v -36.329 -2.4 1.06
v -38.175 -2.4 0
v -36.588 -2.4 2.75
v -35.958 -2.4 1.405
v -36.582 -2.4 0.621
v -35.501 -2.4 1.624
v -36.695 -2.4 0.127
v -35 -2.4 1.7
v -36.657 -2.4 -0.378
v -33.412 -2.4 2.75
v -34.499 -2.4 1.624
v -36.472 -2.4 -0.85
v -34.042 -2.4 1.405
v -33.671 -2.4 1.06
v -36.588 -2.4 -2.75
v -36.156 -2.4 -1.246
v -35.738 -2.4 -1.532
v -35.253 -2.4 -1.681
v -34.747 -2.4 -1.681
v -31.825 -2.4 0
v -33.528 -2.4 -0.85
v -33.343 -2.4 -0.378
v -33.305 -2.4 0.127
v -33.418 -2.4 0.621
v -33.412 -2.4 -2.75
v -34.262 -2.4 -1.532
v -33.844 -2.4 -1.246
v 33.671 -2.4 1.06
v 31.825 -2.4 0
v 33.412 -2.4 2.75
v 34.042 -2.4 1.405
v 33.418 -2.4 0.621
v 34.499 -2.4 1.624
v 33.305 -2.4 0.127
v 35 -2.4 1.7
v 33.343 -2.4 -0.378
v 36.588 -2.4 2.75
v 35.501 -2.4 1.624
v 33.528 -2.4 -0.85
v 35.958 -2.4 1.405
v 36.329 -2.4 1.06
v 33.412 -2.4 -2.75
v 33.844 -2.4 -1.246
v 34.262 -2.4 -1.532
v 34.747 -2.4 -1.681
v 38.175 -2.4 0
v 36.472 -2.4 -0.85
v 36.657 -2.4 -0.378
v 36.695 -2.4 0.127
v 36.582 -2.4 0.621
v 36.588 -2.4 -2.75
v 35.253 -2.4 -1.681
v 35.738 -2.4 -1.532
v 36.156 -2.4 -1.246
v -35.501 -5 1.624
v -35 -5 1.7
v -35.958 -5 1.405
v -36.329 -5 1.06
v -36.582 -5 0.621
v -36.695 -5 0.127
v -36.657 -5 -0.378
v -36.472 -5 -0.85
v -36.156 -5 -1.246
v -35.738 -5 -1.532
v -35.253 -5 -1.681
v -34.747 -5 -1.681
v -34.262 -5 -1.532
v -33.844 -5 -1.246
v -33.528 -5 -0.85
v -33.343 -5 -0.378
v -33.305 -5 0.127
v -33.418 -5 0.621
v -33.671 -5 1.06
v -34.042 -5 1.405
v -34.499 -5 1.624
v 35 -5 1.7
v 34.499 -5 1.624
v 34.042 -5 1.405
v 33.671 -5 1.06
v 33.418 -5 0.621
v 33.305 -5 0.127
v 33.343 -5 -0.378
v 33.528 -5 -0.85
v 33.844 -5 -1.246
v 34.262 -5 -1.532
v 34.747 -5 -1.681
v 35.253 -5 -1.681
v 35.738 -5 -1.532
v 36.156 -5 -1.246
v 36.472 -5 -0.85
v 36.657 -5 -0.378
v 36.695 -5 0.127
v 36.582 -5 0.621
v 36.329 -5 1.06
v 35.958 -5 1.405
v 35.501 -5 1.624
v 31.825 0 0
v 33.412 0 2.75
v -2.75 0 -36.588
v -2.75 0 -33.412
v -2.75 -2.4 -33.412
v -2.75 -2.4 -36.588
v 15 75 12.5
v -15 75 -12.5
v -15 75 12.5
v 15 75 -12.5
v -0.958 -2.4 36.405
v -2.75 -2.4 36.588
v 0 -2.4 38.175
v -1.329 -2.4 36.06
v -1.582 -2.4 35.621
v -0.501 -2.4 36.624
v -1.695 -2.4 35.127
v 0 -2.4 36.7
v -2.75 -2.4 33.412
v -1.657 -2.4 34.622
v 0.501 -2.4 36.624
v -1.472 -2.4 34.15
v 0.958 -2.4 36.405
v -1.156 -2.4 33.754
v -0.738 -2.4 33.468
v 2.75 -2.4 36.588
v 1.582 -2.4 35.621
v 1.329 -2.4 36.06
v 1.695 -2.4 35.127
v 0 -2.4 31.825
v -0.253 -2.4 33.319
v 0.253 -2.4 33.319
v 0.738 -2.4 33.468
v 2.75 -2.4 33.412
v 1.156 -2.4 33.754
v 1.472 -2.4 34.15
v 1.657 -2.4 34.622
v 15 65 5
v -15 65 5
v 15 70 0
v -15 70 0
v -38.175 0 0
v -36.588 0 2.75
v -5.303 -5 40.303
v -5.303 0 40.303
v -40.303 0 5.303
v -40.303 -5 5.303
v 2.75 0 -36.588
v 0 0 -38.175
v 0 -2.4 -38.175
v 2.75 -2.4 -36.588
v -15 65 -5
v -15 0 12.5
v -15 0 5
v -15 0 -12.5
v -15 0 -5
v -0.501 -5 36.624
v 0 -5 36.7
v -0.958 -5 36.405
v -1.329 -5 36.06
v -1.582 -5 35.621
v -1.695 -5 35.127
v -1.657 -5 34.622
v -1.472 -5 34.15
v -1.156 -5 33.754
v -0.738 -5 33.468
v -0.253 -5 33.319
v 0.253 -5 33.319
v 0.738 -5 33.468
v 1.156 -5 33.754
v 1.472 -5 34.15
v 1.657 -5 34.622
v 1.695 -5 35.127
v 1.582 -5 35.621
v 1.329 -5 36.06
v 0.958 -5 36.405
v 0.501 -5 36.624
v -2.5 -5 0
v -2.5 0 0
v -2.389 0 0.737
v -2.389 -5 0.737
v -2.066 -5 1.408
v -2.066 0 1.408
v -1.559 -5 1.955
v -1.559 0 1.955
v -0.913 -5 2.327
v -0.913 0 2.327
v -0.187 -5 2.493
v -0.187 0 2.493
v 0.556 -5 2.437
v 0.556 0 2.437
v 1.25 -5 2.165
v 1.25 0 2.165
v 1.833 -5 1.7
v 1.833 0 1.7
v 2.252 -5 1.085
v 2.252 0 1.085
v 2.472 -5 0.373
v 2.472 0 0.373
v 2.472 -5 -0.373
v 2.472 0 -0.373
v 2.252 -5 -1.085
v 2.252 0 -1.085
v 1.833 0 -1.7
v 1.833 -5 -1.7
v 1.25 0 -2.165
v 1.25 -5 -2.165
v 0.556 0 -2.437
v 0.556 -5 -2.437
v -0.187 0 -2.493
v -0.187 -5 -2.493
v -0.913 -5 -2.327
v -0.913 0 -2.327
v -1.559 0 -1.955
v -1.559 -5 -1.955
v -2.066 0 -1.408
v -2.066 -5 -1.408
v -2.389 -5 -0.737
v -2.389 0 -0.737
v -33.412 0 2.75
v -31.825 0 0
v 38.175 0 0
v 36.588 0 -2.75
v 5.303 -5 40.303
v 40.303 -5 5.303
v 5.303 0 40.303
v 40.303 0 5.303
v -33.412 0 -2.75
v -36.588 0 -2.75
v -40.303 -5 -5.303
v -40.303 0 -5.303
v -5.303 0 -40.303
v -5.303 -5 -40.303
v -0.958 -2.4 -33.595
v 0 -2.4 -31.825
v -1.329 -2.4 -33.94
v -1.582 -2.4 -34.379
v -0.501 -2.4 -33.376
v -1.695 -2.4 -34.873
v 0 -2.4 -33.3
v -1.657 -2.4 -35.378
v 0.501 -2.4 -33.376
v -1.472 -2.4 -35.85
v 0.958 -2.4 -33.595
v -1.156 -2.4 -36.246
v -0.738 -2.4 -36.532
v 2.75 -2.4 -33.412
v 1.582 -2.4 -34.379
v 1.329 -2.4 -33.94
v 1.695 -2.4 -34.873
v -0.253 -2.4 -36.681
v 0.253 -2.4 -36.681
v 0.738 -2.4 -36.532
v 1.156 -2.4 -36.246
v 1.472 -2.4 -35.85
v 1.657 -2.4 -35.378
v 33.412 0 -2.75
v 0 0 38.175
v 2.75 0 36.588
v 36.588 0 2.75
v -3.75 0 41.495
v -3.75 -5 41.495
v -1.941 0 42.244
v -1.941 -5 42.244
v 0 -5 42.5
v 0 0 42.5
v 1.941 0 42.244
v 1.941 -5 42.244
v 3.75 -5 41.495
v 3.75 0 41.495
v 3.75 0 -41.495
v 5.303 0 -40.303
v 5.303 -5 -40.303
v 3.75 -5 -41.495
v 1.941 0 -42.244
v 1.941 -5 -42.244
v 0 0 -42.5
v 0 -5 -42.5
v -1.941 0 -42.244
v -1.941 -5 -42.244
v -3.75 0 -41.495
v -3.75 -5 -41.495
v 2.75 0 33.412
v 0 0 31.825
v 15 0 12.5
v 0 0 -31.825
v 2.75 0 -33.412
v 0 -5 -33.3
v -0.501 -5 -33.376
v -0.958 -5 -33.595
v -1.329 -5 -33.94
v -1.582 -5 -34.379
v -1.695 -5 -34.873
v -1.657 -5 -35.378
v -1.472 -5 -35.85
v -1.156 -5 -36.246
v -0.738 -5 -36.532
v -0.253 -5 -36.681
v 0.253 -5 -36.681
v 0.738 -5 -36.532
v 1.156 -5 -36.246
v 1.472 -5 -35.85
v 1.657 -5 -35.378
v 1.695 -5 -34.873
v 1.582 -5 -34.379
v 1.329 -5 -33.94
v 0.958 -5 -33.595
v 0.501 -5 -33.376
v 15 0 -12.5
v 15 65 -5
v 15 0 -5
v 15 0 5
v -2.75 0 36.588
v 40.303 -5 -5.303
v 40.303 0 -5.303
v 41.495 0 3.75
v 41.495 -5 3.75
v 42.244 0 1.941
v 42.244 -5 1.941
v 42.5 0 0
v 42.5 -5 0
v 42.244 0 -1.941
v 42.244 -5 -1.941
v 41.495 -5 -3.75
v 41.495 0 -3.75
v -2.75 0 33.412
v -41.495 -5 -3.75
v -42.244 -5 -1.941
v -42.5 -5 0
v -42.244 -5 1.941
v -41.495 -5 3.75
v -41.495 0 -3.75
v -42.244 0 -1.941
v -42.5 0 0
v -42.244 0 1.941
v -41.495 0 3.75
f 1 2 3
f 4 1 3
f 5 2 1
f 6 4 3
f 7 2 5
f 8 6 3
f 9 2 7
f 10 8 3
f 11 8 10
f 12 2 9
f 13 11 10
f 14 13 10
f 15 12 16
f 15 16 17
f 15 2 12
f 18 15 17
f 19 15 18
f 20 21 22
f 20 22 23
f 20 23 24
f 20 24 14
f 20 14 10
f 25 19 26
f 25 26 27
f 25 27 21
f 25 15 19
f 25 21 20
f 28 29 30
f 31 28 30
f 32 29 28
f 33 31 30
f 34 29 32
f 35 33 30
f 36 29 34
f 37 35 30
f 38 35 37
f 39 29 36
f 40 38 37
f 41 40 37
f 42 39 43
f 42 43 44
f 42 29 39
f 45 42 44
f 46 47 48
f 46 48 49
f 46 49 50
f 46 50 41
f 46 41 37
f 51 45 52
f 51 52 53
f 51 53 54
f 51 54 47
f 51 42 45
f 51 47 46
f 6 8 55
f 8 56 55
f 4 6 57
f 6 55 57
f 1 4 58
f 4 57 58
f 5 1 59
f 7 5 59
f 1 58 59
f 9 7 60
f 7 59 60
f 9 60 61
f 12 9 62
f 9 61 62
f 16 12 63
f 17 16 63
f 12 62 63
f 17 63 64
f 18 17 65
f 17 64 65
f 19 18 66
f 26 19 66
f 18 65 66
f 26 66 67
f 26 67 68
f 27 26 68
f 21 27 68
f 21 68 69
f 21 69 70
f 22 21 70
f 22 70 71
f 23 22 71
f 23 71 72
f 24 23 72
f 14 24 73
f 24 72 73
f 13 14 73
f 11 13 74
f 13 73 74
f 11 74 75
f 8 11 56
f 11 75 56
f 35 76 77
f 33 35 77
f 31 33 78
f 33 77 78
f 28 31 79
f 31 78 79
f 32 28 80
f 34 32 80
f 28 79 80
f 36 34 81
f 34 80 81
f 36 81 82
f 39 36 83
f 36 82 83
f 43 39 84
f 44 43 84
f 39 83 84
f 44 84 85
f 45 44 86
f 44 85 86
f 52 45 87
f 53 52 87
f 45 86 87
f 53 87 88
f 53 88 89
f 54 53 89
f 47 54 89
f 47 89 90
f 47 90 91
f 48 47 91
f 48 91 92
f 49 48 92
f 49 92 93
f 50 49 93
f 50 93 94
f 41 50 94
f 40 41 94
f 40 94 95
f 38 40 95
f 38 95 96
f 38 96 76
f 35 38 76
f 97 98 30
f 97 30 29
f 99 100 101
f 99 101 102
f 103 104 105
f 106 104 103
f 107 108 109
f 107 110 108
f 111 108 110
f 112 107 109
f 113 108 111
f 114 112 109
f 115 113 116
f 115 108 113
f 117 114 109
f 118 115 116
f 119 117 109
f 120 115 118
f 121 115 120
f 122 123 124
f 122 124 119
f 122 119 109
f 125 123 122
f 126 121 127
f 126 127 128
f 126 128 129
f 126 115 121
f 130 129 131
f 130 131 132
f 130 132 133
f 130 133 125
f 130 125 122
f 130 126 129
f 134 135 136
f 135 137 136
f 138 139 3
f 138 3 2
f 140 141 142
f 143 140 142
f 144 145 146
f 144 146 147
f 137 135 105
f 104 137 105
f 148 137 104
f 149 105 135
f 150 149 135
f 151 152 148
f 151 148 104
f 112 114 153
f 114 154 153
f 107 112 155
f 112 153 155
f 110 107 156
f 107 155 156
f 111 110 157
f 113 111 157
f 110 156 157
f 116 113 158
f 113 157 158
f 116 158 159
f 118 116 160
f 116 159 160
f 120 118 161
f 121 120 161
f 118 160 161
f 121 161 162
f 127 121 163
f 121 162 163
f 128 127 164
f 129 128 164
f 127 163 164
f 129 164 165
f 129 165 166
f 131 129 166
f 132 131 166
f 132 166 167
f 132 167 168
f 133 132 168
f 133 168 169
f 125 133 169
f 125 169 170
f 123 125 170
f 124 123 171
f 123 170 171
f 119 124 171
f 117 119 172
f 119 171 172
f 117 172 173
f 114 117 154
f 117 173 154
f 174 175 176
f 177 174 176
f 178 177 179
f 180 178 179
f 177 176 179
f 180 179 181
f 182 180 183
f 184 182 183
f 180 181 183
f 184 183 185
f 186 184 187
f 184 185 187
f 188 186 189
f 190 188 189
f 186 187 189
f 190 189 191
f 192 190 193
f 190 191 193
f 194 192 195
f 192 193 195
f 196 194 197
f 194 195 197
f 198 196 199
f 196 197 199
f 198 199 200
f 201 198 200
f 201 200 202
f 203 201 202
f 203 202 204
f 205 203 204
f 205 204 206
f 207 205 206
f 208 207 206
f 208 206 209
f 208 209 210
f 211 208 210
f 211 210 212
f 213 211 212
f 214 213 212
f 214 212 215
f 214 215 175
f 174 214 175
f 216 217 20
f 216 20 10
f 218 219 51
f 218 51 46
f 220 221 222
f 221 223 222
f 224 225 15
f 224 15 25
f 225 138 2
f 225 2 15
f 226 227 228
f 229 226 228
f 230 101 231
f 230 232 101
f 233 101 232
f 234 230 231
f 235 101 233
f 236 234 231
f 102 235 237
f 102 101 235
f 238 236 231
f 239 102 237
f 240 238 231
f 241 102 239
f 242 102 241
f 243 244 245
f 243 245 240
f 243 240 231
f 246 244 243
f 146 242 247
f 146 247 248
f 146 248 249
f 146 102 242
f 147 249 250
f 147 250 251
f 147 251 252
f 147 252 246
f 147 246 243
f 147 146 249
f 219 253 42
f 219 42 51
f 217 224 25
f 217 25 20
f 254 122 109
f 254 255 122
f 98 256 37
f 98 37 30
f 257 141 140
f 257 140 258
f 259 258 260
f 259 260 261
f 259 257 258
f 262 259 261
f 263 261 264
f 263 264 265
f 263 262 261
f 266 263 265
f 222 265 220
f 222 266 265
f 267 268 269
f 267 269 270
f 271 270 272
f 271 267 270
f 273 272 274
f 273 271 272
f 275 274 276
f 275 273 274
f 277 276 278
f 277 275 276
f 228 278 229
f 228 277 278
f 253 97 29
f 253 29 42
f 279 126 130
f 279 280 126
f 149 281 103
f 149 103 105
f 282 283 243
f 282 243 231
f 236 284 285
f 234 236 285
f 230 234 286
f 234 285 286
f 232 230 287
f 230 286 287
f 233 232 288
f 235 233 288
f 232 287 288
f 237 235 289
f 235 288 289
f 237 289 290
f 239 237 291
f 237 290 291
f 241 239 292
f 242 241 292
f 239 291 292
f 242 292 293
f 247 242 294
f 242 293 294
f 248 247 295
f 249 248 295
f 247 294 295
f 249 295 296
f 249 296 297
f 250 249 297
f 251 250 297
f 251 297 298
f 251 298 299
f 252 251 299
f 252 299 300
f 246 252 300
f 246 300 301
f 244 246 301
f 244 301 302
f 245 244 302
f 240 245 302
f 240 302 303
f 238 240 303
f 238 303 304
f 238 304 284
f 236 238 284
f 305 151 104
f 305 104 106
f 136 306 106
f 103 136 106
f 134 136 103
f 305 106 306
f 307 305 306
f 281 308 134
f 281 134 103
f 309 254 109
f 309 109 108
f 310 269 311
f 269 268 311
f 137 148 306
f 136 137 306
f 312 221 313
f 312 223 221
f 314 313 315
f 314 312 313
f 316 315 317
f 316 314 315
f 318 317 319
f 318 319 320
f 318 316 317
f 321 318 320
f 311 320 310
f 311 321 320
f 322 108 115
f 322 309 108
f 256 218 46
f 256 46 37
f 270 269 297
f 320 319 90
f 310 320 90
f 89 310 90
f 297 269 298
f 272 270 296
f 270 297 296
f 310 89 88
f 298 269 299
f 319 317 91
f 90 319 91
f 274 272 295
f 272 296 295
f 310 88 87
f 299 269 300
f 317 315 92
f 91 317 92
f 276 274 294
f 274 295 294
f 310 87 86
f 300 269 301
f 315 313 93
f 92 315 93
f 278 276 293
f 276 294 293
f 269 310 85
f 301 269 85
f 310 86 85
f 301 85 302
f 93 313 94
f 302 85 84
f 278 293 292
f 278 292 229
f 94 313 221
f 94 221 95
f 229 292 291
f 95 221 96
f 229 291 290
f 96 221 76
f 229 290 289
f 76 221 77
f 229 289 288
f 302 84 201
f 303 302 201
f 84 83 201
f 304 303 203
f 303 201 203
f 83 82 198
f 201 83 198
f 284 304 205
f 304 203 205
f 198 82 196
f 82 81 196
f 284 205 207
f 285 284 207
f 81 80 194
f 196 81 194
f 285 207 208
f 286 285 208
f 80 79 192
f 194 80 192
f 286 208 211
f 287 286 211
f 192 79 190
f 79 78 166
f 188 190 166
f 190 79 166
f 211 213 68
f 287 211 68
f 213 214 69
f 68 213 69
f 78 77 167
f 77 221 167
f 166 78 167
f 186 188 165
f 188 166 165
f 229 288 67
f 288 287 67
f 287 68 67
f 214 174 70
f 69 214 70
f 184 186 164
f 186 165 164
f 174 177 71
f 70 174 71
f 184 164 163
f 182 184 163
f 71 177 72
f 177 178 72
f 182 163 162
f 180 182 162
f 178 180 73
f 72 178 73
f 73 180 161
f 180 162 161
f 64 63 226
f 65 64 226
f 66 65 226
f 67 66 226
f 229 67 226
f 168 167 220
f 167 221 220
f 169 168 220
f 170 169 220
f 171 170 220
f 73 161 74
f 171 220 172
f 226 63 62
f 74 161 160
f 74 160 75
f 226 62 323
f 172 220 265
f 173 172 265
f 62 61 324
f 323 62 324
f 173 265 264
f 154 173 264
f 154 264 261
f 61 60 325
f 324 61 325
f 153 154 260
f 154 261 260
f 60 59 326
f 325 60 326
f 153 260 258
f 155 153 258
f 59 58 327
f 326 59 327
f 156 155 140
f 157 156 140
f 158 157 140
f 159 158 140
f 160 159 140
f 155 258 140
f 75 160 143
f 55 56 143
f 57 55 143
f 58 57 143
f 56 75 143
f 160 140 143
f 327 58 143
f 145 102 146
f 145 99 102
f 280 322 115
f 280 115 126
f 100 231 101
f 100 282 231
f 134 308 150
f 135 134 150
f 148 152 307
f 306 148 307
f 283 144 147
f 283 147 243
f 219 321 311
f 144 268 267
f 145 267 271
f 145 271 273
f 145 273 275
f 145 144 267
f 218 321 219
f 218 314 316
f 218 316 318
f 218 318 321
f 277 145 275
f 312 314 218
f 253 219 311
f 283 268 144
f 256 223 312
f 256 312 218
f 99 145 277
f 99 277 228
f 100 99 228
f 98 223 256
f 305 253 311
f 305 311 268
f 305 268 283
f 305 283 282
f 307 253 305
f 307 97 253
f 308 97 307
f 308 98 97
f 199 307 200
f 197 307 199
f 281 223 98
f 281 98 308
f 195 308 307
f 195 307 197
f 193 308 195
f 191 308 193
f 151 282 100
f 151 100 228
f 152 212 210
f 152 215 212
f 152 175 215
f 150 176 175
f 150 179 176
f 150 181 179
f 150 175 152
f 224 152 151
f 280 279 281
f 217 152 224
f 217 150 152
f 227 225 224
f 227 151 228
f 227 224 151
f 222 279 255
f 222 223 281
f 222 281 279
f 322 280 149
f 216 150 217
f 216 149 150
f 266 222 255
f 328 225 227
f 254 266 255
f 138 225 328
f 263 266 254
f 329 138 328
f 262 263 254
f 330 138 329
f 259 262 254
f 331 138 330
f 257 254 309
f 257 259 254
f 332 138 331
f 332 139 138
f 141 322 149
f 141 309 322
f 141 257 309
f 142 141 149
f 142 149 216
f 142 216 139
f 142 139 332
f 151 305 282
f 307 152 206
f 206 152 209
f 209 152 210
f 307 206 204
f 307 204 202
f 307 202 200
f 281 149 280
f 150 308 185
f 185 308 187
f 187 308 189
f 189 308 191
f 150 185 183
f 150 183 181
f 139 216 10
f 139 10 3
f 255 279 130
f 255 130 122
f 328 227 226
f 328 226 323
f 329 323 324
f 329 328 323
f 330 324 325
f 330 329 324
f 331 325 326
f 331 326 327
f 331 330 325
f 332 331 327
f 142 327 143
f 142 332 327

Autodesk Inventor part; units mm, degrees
ref_plane "YZ Plane" through (0, 0, 0) normal (1, 0, 0) x (0, 1, 0)
ref_plane "XZ Plane" through (0, 0, 0) normal (0, 1, 0) x (-1, 0, 0)
ref_plane "XY Plane" through (0, 0, 0) normal (0, 0, 1) x (1, 0, 0)
sketch "Sketch1" plane through (0, 0, 0) normal (0, 1, 0) x (-1, 0, 0)
  circle A0 centre (0, 0) radius 17.5 construction
  line L0 (0, 35) -> (0, -35) construction
  line L1 (35, 0) -> (-35, 0) construction
  dimension "d0" = 35
  dimension "d1" = 70
  dimension "d2" = 70
sketch "Sketch2" plane through (0, 0, 0) normal (0, 1, 0) x (-1, 0, 0)
  circle A0 centre (0, 0) radius 17.5 construction
  line L0 (0, 35) -> (0, -35) construction
  line L1 (35, 0) -> (-35, 0) construction
  circle A1 centre (35, 0) radius 7.5
  circle A2 centre (0, 35) radius 7.5
  circle A3 centre (-35, 0) radius 7.5
  circle A4 centre (0, -35) radius 7.5
  line L2 (5.3033, 40.3033) -> (40.3033, 5.3033)
  line L3 (-40.3033, 5.3033) -> (-5.3033, 40.3033)
  line L4 (-5.3033, -40.3033) -> (-40.3033, -5.3033)
  line L5 (40.3033, -5.3033) -> (5.3033, -40.3033)
  circle A5 centre (0, 0) radius 2.5
  point P0 (5.3033, -40.3033)
  point P1 (-40.3033, -5.3033)
  dimension "d3" = 15
  dimension "d6" = 360
  dimension "d10" = 360
  dimension "d14" = 5
extrude "Extrusion1" add sketch "Sketch2" against normal blind 5
hole "Hole1" at (0, 0, -35) at (0, 0, 35) at (-35, 0, 0) at (35, 0, 0) direction (0, -1, 0) diameter 3.4 end through all clearance for "Socket Head Cap Screw ISO 4762" size "M3" standard "ISO"
sketch "Sketch3" plane through (0, 0, 0) normal (0, 1, 0) x (1, 0, 0)
  line L0 (15, -12.5) -> (-15, -12.5)
  line L1 (-15, -12.5) -> (-15, 12.5)
  line L2 (-15, 12.5) -> (15, 12.5)
  line L3 (15, 12.5) -> (15, -12.5)
  circle A0 centre (0, 0) radius 2.5 projected
  line L4 (15, -12.5) -> (-15, 12.5) construction
  line L5 (-15, -12.5) -> (15, 12.5) construction
  line L6 (15, -5) -> (-15, -5)
  line L7 (-15, -5) -> (-15, 5)
  line L8 (-15, 5) -> (15, 5)
  line L9 (15, 5) -> (15, -5)
  line L10 (15, -5) -> (-15, 5) construction
  line L11 (-15, -5) -> (15, 5) construction
  point P0 (15, -5)
  dimension "d22" = 30
  dimension "d23" = 25
  dimension "d24" = 10
extrude "Extrusion2" add sketch "Sketch3" along normal blind 70 contours L0 L1 L6 L3 | L8 L1 L2 L3
sketch "Sketch4" plane through (0, 70, 0) normal (0, 1, 0) x (1, 0, 0)
  line L0 (-15, 12.5) -> (15, 12.5)
  line L1 (15, 12.5) -> (15, -12.5)
  line L2 (15, -12.5) -> (-15, -12.5)
  line L3 (-15, -12.5) -> (-15, 12.5)
  point P0 (0, 0)
extrude "Extrusion3" add sketch "Sketch4" along normal blind 5
sketch "Sketch5" plane through (0, 0, 0) normal (0, 1, 0) x (1, 0, 0)
  line L0 (15, -12.5) -> (-15, -12.5) projected
  line L1 (-15, -12.5) -> (-15, -5) projected
  line L2 (-15, -5) -> (15, -5) projected
  line L3 (15, -5) -> (15, -12.5) projected
  line L4 (-15, 12.5) -> (15, 12.5) projected
  line L5 (15, 12.5) -> (15, 5) projected
  line L6 (15, 5) -> (-15, 5) projected
  line L7 (-15, 5) -> (-15, 12.5) projected
  circle A0 centre (35, 0) radius 1.7 projected
  circle A1 centre (-35, 0) radius 1.7 projected
  circle A2 centre (0, -35) radius 1.7 projected
  circle A3 centre (0, 35) radius 1.7 projected
  arc A4 (-40.3033, 5.3033) -> (-40.3033, -5.3033) centre (-35, 0) ccw projected
  line L8 (-40.3033, -5.3033) -> (-5.3033, -40.3033) projected
  arc A5 (-5.3033, -40.3033) -> (5.3033, -40.3033) centre (0, -35) ccw projected
  line L9 (5.3033, -40.3033) -> (40.3033, -5.3033) projected
  arc A6 (40.3033, -5.3033) -> (40.3033, 5.3033) centre (35, 0) ccw projected
  line L10 (40.3033, 5.3033) -> (5.3033, 40.3033) projected
  arc A7 (5.3033, 40.3033) -> (-5.3033, 40.3033) centre (0, 35) ccw projected
  line L11 (-5.3033, 40.3033) -> (-40.3033, 5.3033) projected
  circle A8 centre (0, 0) radius 2.5 projected
  circle A9 centre (-35, 0) radius 2.75 construction
  line L12 (-33.4123, 2.75) -> (-31.8246, 0)
  line L13 (-31.8246, 0) -> (-33.4123, -2.75)
  line L14 (-33.4123, -2.75) -> (-36.5877, -2.75)
  line L15 (-36.5877, -2.75) -> (-38.1754, 0)
  line L16 (-38.1754, 0) -> (-36.5877, 2.75)
  line L17 (-36.5877, 2.75) -> (-33.4123, 2.75)
  line L18 (-2.75, -33.4123) -> (0, -31.8246)
  line L19 (0, -31.8246) -> (2.75, -33.4123)
  circle A10 centre (0, -35) radius 2.75 construction
  line L20 (0, -38.1754) -> (-2.75, -36.5877)
  line L21 (2.75, -36.5877) -> (0, -38.1754)
  line L22 (2.75, -33.4123) -> (2.75, -36.5877)
  line L23 (-2.75, -36.5877) -> (-2.75, -33.4123)
  line L24 (33.4123, -2.75) -> (31.8246, 0)
  line L25 (31.8246, 0) -> (33.4123, 2.75)
  circle A11 centre (35, 0) radius 2.75 construction
  line L26 (38.1754, 0) -> (36.5877, -2.75)
  line L27 (36.5877, 2.75) -> (38.1754, 0)
  line L28 (33.4123, 2.75) -> (36.5877, 2.75)
  line L29 (36.5877, -2.75) -> (33.4123, -2.75)
  line L30 (2.75, 33.4123) -> (0, 31.8246)
  line L31 (0, 31.8246) -> (-2.75, 33.4123)
  circle A12 centre (0, 35) radius 2.75 construction
  line L32 (0, 38.1754) -> (2.75, 36.5877)
  line L33 (-2.75, 36.5877) -> (0, 38.1754)
  line L34 (-2.75, 33.4123) -> (-2.75, 36.5877)
  line L35 (2.75, 36.5877) -> (2.75, 33.4123)
  point P0 (-35, 2.75)
  point P1 (-2.75, -35)
  point P2 (35, -2.75)
  point P3 (2.75, 35)
  dimension "d29" = 5.5
  dimension "d32" = 360
extrude "Extrusion4" cut sketch "Sketch5" against normal blind 2.4 contours A0 | A1 | A2 | L12 L13 L14 L15 L16 L17 | L18 L19 L22 L21 L20 L23 | L24 L25 L28 L27 L26 L29 | L30 L31 L34 L33 L32 L35
chamfer "Chamfer1" distance 5 angle 45 2 edges at (0, 70, -5) (0, 70, 5)
properties part number "turning prevention"
